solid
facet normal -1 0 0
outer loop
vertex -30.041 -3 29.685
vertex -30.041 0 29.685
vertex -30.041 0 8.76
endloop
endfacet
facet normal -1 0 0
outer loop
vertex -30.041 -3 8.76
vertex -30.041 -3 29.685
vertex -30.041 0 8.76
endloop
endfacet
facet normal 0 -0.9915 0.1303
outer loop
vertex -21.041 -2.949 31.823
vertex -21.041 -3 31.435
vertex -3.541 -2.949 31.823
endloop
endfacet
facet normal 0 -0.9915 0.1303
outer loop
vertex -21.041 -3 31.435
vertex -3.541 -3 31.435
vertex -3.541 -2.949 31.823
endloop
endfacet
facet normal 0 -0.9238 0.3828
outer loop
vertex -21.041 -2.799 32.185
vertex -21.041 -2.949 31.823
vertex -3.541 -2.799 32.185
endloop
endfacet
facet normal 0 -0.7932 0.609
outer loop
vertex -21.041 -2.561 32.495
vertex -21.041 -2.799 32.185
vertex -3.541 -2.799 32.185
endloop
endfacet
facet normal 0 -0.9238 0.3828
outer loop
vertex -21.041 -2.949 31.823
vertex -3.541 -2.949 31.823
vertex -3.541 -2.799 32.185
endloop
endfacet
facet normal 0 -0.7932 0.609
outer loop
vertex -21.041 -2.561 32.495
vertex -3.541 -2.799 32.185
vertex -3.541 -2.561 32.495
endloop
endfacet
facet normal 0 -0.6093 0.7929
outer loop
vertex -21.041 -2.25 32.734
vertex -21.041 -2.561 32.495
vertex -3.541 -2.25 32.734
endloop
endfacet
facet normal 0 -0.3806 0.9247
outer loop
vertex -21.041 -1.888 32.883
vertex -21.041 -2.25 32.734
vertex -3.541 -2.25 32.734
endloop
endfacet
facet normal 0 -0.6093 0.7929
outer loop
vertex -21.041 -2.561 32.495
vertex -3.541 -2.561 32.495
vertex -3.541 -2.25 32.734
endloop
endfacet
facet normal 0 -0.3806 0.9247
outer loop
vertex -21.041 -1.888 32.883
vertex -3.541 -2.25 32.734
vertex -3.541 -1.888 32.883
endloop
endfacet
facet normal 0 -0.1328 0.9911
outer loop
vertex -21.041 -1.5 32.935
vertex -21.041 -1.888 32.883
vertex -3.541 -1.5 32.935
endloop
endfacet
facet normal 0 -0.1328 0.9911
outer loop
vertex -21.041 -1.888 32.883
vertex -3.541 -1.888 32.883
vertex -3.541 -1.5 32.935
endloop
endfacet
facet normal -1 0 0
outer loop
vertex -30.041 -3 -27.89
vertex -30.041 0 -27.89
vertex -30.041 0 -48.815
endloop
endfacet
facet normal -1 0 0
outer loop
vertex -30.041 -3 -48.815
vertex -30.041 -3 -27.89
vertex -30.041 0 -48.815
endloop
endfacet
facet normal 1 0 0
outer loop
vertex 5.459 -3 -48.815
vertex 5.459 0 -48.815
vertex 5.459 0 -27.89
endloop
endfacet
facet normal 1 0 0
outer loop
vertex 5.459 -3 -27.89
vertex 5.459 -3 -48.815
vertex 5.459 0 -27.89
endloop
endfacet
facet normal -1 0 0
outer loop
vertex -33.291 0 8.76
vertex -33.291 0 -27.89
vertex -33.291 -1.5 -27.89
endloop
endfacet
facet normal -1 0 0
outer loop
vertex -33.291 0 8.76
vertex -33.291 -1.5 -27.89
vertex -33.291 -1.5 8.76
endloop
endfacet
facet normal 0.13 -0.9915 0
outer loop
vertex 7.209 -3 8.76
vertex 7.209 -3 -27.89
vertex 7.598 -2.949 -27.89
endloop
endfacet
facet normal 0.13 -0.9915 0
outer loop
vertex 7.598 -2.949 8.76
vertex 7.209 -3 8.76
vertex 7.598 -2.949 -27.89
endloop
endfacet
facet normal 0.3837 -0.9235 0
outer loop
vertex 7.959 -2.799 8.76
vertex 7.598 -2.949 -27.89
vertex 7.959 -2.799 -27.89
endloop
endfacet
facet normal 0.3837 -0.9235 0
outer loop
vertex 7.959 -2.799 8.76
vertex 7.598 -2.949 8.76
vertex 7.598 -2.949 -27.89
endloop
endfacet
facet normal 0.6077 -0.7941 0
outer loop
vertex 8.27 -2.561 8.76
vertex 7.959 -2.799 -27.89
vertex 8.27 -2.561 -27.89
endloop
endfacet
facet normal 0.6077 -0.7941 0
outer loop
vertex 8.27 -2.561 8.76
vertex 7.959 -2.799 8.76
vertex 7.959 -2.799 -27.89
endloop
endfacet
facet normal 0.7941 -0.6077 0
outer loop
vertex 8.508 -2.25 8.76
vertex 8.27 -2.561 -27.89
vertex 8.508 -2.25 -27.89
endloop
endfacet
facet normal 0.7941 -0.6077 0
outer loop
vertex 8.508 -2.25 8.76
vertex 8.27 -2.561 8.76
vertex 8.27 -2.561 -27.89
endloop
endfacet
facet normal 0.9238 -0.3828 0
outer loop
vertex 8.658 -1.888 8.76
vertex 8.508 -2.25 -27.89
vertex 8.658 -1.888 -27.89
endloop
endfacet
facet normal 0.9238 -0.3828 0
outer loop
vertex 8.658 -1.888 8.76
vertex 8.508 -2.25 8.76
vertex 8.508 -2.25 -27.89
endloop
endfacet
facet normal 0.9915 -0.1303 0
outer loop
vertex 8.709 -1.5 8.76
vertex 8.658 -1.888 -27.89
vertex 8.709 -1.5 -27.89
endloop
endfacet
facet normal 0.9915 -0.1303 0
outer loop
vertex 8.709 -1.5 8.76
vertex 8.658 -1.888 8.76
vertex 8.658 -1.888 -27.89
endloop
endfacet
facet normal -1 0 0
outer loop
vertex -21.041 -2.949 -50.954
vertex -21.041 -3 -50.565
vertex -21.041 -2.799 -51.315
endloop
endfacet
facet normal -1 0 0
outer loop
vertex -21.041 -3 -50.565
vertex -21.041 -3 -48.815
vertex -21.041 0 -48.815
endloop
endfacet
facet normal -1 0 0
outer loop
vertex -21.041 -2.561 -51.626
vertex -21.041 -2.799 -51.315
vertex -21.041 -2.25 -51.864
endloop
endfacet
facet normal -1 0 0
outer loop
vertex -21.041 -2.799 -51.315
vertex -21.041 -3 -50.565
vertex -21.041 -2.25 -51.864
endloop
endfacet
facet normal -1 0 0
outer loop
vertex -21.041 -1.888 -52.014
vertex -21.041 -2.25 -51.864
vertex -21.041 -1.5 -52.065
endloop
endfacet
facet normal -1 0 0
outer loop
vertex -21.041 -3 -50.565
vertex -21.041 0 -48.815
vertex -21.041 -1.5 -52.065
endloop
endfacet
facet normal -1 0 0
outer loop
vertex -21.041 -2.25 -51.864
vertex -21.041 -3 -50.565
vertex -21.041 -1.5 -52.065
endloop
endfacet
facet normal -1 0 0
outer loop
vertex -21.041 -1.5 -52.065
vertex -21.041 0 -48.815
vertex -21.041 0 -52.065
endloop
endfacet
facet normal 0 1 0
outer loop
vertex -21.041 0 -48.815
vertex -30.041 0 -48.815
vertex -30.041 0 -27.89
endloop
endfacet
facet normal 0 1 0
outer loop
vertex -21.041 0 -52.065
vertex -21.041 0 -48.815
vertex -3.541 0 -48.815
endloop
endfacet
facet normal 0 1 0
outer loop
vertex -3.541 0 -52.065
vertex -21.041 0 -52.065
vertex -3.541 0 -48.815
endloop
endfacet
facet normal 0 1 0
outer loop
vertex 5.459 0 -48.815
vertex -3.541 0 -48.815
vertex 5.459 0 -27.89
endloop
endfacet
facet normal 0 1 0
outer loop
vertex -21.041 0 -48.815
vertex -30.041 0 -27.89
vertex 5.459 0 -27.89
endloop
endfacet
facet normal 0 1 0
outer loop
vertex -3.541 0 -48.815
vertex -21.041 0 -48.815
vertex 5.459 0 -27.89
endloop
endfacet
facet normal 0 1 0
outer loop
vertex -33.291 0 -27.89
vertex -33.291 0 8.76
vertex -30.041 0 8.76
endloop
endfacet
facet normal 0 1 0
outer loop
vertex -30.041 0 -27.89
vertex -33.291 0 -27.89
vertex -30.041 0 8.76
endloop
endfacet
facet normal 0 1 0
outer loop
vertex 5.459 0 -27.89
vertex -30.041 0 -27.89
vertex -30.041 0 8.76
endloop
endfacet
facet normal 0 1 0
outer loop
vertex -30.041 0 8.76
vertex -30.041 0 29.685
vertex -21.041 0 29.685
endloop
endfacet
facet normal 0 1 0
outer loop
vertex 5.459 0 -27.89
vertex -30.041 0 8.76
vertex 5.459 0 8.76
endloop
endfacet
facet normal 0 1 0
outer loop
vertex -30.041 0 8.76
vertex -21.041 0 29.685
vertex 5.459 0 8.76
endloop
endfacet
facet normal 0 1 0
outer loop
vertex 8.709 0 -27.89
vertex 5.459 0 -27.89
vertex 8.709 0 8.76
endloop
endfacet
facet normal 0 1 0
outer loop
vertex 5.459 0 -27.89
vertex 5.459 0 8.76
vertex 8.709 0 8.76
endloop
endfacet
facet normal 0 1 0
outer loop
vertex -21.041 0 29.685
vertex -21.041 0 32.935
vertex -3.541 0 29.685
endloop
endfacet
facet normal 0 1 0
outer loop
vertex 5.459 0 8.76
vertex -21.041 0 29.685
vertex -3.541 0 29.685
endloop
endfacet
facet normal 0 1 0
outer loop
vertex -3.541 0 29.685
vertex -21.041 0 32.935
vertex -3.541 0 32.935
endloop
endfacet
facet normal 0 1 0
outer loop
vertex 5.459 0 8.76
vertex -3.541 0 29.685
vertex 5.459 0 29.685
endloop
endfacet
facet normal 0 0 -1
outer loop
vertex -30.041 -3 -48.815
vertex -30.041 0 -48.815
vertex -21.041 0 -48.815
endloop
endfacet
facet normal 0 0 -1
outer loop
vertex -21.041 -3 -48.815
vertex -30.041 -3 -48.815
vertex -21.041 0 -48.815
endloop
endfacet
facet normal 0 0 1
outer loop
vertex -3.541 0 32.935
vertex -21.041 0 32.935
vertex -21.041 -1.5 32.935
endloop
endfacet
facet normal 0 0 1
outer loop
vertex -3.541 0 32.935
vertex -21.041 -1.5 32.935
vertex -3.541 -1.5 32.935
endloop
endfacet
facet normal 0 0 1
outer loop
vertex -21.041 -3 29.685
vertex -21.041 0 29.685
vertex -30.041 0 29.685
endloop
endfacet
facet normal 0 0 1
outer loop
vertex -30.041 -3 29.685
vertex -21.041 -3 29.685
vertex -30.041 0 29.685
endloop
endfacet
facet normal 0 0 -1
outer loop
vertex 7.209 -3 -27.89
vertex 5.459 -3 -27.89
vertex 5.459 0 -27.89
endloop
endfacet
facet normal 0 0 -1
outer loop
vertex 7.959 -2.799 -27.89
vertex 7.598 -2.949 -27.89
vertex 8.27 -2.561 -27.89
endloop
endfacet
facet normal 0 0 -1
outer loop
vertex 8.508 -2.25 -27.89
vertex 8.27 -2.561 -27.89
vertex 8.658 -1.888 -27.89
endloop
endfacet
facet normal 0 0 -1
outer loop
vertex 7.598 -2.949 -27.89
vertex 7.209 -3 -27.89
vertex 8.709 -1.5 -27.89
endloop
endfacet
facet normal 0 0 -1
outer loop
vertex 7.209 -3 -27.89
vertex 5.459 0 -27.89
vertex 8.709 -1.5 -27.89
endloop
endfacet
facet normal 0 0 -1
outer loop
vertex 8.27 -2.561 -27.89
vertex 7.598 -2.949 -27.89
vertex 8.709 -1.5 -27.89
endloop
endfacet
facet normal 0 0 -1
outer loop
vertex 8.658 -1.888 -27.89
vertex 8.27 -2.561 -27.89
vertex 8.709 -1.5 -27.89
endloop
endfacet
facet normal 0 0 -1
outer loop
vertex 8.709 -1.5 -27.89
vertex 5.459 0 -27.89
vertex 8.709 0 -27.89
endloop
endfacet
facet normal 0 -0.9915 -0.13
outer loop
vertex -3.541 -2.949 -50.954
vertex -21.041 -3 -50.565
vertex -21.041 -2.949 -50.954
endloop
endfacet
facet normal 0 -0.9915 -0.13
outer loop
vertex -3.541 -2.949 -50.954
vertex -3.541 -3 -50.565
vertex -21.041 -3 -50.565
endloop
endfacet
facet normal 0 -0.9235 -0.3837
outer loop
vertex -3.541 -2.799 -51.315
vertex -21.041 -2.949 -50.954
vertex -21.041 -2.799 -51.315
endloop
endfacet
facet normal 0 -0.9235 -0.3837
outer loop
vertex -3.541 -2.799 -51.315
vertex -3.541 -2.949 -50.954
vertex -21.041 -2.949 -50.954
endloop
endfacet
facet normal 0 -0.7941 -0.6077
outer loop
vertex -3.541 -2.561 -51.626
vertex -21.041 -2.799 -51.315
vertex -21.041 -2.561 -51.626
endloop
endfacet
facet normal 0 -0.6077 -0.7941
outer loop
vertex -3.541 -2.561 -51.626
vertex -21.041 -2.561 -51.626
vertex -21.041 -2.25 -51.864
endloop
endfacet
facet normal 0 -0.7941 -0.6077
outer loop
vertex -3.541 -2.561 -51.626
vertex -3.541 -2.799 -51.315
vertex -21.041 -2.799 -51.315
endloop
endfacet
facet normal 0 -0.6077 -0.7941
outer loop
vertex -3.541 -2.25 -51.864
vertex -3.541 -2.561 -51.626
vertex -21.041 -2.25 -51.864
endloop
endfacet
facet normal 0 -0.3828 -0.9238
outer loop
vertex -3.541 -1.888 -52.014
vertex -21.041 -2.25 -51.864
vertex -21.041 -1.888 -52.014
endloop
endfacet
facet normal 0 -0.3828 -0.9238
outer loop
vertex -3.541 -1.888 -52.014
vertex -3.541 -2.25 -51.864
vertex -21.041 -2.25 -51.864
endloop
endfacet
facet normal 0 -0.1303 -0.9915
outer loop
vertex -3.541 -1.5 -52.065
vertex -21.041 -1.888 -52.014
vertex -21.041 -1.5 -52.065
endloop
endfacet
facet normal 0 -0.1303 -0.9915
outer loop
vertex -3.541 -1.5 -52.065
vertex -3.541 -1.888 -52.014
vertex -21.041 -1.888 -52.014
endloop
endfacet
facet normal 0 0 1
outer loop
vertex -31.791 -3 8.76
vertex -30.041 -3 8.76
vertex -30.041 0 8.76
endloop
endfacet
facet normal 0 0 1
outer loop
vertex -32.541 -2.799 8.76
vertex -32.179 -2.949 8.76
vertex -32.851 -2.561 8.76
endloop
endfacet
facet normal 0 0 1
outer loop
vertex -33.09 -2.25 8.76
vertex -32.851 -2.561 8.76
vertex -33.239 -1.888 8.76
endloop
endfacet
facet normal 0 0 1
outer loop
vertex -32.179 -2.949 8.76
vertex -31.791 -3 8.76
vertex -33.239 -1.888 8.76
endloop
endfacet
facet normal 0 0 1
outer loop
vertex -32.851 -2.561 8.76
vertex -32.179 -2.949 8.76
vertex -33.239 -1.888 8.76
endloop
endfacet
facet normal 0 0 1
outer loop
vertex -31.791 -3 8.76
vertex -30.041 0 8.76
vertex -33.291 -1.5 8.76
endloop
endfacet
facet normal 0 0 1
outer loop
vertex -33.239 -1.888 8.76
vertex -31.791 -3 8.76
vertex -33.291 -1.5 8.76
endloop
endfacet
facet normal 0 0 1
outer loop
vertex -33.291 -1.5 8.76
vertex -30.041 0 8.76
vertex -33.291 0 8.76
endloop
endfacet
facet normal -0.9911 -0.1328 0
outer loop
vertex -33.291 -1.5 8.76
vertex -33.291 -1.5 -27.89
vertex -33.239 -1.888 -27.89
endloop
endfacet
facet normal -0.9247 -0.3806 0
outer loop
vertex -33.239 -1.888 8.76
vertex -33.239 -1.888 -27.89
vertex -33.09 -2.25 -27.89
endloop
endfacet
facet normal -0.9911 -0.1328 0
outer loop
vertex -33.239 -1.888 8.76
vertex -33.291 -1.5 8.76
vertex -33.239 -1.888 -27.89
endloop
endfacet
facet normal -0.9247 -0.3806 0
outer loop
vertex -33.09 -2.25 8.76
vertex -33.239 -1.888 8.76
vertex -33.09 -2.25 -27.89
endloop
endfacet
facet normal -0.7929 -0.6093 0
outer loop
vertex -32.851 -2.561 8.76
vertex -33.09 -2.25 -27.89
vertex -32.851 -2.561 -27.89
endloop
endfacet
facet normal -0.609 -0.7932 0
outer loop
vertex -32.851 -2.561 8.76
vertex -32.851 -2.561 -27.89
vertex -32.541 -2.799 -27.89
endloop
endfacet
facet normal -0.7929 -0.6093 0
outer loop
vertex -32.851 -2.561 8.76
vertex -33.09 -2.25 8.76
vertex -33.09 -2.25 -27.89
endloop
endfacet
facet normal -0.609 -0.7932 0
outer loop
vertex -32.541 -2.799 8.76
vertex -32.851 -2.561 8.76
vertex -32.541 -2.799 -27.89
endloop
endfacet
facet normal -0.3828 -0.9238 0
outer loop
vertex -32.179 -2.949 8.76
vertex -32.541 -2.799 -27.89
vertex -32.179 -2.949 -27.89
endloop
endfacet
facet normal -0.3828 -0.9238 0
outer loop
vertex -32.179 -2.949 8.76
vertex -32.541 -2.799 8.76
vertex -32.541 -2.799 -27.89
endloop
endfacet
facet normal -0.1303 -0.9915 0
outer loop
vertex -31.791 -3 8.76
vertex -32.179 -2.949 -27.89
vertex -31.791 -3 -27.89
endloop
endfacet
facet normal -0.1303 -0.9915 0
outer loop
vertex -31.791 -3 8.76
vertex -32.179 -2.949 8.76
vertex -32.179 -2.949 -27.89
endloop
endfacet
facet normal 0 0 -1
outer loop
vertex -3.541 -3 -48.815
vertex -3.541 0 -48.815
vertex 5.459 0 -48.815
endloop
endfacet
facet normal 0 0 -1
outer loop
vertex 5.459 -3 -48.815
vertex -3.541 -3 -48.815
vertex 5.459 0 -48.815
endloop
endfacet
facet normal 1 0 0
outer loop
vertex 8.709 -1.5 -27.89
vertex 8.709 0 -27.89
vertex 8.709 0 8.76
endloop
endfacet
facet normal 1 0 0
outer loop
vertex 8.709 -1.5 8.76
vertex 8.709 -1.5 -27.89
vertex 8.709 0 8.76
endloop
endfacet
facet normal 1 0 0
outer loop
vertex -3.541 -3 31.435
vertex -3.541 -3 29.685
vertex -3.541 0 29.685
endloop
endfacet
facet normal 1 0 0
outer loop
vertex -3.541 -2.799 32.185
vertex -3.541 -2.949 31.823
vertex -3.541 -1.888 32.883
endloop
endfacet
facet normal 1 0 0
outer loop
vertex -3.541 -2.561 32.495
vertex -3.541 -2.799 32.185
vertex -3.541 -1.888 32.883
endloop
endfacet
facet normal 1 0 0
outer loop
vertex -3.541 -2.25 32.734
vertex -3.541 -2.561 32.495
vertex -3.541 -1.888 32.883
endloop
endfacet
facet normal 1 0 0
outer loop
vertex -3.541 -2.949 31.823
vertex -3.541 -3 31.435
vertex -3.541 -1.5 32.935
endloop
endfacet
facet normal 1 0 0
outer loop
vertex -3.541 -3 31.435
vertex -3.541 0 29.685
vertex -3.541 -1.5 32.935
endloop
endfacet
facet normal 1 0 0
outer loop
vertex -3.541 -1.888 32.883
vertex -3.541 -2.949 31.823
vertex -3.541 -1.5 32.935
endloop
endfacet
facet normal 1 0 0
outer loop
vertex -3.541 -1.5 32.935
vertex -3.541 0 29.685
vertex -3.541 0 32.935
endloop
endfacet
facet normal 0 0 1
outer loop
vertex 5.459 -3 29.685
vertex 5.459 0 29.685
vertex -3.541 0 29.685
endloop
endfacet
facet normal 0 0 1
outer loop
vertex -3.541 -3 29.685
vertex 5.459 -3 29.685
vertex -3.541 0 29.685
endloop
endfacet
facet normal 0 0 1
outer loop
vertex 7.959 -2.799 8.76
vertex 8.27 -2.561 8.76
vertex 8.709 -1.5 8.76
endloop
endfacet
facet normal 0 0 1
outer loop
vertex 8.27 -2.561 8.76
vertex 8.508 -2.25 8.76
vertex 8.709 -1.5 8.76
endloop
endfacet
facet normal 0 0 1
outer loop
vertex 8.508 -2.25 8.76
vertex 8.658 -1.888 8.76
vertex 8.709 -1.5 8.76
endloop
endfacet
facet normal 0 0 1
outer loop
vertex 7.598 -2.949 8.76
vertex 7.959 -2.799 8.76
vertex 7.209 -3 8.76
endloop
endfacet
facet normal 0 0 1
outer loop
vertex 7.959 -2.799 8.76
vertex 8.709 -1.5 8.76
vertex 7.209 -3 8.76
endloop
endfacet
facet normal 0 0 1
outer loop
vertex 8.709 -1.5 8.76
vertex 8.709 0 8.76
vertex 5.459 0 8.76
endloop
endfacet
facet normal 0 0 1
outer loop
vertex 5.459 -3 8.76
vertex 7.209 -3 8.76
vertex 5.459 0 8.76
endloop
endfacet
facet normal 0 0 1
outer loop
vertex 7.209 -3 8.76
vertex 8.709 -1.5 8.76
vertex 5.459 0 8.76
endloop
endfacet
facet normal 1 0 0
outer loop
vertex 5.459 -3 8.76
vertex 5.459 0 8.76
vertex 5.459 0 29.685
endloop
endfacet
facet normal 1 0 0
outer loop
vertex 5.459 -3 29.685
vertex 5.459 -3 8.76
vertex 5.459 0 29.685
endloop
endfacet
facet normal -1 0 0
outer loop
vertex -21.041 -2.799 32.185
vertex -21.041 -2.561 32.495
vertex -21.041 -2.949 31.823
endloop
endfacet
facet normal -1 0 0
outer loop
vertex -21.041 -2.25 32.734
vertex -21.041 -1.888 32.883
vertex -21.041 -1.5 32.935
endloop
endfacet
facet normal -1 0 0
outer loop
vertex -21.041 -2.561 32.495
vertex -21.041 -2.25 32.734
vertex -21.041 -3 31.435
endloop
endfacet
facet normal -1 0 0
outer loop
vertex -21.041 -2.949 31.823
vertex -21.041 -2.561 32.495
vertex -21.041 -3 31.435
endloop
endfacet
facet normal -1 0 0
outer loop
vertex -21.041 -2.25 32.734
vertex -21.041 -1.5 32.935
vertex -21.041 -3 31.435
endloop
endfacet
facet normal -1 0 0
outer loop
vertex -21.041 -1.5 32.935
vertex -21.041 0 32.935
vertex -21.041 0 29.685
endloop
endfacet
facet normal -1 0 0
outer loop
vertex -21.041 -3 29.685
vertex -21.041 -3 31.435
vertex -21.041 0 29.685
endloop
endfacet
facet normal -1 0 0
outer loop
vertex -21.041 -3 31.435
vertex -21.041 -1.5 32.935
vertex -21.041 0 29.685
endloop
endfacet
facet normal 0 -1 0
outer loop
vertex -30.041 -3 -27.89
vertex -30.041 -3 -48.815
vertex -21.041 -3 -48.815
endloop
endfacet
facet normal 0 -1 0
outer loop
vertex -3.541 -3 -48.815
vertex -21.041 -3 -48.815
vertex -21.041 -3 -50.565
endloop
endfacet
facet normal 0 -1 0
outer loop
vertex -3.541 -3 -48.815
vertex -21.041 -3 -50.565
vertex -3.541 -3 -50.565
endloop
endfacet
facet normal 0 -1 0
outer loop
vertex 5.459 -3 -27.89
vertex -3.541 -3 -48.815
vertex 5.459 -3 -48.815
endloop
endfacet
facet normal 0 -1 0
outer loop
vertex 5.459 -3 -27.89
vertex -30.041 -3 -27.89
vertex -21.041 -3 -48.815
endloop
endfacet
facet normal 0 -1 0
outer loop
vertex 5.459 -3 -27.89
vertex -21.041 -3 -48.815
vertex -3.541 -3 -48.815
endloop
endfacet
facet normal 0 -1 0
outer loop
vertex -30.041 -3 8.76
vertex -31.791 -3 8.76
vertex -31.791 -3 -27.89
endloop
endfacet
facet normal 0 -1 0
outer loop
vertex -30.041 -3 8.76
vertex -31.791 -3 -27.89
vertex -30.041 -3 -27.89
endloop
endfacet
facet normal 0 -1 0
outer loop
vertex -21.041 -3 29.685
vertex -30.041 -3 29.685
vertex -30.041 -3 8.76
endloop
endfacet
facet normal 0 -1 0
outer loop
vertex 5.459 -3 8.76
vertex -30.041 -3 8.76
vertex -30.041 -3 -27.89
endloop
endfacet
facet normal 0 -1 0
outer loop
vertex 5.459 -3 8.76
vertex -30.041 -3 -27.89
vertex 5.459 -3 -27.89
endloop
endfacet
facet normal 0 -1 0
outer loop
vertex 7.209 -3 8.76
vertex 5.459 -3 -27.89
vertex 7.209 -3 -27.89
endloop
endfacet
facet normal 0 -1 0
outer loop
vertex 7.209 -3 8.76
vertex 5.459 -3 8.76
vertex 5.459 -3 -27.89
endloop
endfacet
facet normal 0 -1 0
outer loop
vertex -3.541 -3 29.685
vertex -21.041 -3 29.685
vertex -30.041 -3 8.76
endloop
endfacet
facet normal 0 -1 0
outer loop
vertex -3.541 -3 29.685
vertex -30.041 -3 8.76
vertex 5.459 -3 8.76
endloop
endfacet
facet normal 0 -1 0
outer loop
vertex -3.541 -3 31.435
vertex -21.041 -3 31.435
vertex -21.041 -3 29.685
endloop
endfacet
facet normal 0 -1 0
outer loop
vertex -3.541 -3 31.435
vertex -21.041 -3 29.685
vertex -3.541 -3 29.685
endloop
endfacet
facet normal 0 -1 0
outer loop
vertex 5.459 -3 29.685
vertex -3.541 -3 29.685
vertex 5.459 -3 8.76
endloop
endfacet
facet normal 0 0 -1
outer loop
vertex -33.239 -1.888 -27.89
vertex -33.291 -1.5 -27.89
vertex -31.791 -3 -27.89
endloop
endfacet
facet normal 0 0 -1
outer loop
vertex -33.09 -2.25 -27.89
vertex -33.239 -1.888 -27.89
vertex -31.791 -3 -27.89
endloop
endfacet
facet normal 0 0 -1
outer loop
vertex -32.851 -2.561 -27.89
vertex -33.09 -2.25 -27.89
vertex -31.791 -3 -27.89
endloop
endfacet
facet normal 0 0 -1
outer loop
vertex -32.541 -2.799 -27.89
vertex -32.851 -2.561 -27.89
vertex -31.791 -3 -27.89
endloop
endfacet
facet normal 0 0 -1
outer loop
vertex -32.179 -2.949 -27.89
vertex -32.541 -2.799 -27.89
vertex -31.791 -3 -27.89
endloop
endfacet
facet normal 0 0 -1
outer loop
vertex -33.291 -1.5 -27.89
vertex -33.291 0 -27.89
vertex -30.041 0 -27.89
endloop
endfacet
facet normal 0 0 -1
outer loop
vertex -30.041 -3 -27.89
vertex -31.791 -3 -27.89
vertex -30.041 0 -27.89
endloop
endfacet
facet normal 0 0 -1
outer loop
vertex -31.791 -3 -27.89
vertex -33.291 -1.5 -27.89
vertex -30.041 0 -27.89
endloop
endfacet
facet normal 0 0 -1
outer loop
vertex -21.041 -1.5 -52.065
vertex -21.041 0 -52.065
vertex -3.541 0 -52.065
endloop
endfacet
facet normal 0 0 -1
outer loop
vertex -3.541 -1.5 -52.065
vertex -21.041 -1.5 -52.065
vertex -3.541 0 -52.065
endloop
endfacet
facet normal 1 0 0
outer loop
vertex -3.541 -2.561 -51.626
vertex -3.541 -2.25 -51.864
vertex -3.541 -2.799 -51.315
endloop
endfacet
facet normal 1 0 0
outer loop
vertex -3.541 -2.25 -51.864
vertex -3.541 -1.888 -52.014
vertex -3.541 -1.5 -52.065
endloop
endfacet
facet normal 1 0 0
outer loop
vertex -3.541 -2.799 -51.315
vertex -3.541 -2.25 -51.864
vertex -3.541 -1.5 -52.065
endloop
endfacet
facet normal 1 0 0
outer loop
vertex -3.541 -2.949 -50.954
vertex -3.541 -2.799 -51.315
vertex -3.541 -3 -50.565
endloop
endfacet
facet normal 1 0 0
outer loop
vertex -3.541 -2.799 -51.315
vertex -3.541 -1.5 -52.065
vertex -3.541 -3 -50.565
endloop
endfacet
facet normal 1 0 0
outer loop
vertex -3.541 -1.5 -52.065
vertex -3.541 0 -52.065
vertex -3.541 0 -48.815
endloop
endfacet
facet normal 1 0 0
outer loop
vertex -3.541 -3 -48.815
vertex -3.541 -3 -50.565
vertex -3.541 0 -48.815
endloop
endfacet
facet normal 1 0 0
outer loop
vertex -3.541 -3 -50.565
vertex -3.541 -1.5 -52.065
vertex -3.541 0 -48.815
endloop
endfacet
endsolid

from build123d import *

# Parameters (mm, degrees)
F0_W     = 42
F0_H     = 85
F1_DEPTH = 3
F2_R     = 3
F4_DEPTH = 3
F5_R     = 1.5


with BuildPart() as f1:
    # F0 (on Front) → F1 (new body)
    with BuildSketch(Plane.XZ):
        with Locations((-12.290565, -9.565399)):
            Rectangle(F0_W, F0_H)
    extrude(amount=F1_DEPTH)

    # F2
    f2_edges = [f1.edges().sort_by_distance(p)[0] for p in [
        (-33.290565, -1.5, 32.934601),
        (8.709435, -1.5, 32.934601),
        (8.709435, -1.5, -52.065399),
        (-33.290565, -1.5, -52.065399),
    ]]
    fillet(f2_edges, radius=F2_R)

    # F3 (on face) → F4 (cut, through all)
    with BuildSketch(Plane(origin=(0, 0, 0), x_dir=(-1, 0, 0), z_dir=(0, 1, 0))):
        with BuildLine():
            Line((-5.459435, 8.759601), (-5.459435, 29.684601))
            Line((-5.459435, 29.684601), (3.540565, 29.684601))
            Line((3.540565, 29.684601), (3.540565, 32.934601))
            Line((3.540565, 32.934601), (-5.709435, 32.934601))
            ThreePointArc((-5.709435, 32.934601), (-7.830755, 32.055922), (-8.709435, 29.934601))
            Line((-8.709435, 29.934601), (-8.709435, 8.759601))
            Line((-8.709435, 8.759601), (-5.459435, 8.759601))
        make_face()
        with BuildLine():
            Line((21.040565, 32.934601), (21.040565, 29.684601))
            Line((21.040565, 29.684601), (30.040565, 29.684601))
            Line((30.040565, 29.684601), (30.040565, 8.759601))
            Line((30.040565, 8.759601), (33.290565, 8.759601))
            Line((33.290565, 8.759601), (33.290565, 29.934601))
            ThreePointArc((33.290565, 29.934601), (32.411885, 32.055922), (30.290565, 32.934601))
            Line((30.290565, 32.934601), (21.040565, 32.934601))
        make_face()
        with BuildLine():
            Line((33.290565, -27.890399), (30.040565, -27.890399))
            Line((30.040565, -27.890399), (30.040565, -48.815399))
            Line((30.040565, -48.815399), (21.040565, -48.815399))
            Line((21.040565, -48.815399), (21.040565, -52.065399))
            Line((21.040565, -52.065399), (30.290565, -52.065399))
            ThreePointArc((30.290565, -52.065399), (32.411885, -51.186719), (33.290565, -49.065399))
            Line((33.290565, -49.065399), (33.290565, -27.890399))
        make_face()
        with BuildLine():
            Line((-5.459435, -48.815399), (-5.459435, -27.890399))
            Line((-5.459435, -27.890399), (-8.709435, -27.890399))
            Line((-8.709435, -27.890399), (-8.709435, -49.065399))
            ThreePointArc((-8.709435, -49.065399), (-7.830755, -51.186719), (-5.709435, -52.065399))
            Line((-5.709435, -52.065399), (3.540565, -52.065399))
            Line((3.540565, -52.065399), (3.540565, -48.815399))
            Line((3.540565, -48.815399), (-5.459435, -48.815399))
        make_face()
    extrude(amount=-F4_DEPTH, mode=Mode.SUBTRACT)

    # F5
    f5_edges = [f1.edges().sort_by_distance(p)[0] for p in [
        (-12.290565, -3, 32.934601),
        (8.709435, -3, -9.565399),
        (-12.290565, -3, -52.065399),
        (-33.290565, -3, -9.565399),
    ]]
    fillet(f5_edges, radius=F5_R)


solid = f1.part
